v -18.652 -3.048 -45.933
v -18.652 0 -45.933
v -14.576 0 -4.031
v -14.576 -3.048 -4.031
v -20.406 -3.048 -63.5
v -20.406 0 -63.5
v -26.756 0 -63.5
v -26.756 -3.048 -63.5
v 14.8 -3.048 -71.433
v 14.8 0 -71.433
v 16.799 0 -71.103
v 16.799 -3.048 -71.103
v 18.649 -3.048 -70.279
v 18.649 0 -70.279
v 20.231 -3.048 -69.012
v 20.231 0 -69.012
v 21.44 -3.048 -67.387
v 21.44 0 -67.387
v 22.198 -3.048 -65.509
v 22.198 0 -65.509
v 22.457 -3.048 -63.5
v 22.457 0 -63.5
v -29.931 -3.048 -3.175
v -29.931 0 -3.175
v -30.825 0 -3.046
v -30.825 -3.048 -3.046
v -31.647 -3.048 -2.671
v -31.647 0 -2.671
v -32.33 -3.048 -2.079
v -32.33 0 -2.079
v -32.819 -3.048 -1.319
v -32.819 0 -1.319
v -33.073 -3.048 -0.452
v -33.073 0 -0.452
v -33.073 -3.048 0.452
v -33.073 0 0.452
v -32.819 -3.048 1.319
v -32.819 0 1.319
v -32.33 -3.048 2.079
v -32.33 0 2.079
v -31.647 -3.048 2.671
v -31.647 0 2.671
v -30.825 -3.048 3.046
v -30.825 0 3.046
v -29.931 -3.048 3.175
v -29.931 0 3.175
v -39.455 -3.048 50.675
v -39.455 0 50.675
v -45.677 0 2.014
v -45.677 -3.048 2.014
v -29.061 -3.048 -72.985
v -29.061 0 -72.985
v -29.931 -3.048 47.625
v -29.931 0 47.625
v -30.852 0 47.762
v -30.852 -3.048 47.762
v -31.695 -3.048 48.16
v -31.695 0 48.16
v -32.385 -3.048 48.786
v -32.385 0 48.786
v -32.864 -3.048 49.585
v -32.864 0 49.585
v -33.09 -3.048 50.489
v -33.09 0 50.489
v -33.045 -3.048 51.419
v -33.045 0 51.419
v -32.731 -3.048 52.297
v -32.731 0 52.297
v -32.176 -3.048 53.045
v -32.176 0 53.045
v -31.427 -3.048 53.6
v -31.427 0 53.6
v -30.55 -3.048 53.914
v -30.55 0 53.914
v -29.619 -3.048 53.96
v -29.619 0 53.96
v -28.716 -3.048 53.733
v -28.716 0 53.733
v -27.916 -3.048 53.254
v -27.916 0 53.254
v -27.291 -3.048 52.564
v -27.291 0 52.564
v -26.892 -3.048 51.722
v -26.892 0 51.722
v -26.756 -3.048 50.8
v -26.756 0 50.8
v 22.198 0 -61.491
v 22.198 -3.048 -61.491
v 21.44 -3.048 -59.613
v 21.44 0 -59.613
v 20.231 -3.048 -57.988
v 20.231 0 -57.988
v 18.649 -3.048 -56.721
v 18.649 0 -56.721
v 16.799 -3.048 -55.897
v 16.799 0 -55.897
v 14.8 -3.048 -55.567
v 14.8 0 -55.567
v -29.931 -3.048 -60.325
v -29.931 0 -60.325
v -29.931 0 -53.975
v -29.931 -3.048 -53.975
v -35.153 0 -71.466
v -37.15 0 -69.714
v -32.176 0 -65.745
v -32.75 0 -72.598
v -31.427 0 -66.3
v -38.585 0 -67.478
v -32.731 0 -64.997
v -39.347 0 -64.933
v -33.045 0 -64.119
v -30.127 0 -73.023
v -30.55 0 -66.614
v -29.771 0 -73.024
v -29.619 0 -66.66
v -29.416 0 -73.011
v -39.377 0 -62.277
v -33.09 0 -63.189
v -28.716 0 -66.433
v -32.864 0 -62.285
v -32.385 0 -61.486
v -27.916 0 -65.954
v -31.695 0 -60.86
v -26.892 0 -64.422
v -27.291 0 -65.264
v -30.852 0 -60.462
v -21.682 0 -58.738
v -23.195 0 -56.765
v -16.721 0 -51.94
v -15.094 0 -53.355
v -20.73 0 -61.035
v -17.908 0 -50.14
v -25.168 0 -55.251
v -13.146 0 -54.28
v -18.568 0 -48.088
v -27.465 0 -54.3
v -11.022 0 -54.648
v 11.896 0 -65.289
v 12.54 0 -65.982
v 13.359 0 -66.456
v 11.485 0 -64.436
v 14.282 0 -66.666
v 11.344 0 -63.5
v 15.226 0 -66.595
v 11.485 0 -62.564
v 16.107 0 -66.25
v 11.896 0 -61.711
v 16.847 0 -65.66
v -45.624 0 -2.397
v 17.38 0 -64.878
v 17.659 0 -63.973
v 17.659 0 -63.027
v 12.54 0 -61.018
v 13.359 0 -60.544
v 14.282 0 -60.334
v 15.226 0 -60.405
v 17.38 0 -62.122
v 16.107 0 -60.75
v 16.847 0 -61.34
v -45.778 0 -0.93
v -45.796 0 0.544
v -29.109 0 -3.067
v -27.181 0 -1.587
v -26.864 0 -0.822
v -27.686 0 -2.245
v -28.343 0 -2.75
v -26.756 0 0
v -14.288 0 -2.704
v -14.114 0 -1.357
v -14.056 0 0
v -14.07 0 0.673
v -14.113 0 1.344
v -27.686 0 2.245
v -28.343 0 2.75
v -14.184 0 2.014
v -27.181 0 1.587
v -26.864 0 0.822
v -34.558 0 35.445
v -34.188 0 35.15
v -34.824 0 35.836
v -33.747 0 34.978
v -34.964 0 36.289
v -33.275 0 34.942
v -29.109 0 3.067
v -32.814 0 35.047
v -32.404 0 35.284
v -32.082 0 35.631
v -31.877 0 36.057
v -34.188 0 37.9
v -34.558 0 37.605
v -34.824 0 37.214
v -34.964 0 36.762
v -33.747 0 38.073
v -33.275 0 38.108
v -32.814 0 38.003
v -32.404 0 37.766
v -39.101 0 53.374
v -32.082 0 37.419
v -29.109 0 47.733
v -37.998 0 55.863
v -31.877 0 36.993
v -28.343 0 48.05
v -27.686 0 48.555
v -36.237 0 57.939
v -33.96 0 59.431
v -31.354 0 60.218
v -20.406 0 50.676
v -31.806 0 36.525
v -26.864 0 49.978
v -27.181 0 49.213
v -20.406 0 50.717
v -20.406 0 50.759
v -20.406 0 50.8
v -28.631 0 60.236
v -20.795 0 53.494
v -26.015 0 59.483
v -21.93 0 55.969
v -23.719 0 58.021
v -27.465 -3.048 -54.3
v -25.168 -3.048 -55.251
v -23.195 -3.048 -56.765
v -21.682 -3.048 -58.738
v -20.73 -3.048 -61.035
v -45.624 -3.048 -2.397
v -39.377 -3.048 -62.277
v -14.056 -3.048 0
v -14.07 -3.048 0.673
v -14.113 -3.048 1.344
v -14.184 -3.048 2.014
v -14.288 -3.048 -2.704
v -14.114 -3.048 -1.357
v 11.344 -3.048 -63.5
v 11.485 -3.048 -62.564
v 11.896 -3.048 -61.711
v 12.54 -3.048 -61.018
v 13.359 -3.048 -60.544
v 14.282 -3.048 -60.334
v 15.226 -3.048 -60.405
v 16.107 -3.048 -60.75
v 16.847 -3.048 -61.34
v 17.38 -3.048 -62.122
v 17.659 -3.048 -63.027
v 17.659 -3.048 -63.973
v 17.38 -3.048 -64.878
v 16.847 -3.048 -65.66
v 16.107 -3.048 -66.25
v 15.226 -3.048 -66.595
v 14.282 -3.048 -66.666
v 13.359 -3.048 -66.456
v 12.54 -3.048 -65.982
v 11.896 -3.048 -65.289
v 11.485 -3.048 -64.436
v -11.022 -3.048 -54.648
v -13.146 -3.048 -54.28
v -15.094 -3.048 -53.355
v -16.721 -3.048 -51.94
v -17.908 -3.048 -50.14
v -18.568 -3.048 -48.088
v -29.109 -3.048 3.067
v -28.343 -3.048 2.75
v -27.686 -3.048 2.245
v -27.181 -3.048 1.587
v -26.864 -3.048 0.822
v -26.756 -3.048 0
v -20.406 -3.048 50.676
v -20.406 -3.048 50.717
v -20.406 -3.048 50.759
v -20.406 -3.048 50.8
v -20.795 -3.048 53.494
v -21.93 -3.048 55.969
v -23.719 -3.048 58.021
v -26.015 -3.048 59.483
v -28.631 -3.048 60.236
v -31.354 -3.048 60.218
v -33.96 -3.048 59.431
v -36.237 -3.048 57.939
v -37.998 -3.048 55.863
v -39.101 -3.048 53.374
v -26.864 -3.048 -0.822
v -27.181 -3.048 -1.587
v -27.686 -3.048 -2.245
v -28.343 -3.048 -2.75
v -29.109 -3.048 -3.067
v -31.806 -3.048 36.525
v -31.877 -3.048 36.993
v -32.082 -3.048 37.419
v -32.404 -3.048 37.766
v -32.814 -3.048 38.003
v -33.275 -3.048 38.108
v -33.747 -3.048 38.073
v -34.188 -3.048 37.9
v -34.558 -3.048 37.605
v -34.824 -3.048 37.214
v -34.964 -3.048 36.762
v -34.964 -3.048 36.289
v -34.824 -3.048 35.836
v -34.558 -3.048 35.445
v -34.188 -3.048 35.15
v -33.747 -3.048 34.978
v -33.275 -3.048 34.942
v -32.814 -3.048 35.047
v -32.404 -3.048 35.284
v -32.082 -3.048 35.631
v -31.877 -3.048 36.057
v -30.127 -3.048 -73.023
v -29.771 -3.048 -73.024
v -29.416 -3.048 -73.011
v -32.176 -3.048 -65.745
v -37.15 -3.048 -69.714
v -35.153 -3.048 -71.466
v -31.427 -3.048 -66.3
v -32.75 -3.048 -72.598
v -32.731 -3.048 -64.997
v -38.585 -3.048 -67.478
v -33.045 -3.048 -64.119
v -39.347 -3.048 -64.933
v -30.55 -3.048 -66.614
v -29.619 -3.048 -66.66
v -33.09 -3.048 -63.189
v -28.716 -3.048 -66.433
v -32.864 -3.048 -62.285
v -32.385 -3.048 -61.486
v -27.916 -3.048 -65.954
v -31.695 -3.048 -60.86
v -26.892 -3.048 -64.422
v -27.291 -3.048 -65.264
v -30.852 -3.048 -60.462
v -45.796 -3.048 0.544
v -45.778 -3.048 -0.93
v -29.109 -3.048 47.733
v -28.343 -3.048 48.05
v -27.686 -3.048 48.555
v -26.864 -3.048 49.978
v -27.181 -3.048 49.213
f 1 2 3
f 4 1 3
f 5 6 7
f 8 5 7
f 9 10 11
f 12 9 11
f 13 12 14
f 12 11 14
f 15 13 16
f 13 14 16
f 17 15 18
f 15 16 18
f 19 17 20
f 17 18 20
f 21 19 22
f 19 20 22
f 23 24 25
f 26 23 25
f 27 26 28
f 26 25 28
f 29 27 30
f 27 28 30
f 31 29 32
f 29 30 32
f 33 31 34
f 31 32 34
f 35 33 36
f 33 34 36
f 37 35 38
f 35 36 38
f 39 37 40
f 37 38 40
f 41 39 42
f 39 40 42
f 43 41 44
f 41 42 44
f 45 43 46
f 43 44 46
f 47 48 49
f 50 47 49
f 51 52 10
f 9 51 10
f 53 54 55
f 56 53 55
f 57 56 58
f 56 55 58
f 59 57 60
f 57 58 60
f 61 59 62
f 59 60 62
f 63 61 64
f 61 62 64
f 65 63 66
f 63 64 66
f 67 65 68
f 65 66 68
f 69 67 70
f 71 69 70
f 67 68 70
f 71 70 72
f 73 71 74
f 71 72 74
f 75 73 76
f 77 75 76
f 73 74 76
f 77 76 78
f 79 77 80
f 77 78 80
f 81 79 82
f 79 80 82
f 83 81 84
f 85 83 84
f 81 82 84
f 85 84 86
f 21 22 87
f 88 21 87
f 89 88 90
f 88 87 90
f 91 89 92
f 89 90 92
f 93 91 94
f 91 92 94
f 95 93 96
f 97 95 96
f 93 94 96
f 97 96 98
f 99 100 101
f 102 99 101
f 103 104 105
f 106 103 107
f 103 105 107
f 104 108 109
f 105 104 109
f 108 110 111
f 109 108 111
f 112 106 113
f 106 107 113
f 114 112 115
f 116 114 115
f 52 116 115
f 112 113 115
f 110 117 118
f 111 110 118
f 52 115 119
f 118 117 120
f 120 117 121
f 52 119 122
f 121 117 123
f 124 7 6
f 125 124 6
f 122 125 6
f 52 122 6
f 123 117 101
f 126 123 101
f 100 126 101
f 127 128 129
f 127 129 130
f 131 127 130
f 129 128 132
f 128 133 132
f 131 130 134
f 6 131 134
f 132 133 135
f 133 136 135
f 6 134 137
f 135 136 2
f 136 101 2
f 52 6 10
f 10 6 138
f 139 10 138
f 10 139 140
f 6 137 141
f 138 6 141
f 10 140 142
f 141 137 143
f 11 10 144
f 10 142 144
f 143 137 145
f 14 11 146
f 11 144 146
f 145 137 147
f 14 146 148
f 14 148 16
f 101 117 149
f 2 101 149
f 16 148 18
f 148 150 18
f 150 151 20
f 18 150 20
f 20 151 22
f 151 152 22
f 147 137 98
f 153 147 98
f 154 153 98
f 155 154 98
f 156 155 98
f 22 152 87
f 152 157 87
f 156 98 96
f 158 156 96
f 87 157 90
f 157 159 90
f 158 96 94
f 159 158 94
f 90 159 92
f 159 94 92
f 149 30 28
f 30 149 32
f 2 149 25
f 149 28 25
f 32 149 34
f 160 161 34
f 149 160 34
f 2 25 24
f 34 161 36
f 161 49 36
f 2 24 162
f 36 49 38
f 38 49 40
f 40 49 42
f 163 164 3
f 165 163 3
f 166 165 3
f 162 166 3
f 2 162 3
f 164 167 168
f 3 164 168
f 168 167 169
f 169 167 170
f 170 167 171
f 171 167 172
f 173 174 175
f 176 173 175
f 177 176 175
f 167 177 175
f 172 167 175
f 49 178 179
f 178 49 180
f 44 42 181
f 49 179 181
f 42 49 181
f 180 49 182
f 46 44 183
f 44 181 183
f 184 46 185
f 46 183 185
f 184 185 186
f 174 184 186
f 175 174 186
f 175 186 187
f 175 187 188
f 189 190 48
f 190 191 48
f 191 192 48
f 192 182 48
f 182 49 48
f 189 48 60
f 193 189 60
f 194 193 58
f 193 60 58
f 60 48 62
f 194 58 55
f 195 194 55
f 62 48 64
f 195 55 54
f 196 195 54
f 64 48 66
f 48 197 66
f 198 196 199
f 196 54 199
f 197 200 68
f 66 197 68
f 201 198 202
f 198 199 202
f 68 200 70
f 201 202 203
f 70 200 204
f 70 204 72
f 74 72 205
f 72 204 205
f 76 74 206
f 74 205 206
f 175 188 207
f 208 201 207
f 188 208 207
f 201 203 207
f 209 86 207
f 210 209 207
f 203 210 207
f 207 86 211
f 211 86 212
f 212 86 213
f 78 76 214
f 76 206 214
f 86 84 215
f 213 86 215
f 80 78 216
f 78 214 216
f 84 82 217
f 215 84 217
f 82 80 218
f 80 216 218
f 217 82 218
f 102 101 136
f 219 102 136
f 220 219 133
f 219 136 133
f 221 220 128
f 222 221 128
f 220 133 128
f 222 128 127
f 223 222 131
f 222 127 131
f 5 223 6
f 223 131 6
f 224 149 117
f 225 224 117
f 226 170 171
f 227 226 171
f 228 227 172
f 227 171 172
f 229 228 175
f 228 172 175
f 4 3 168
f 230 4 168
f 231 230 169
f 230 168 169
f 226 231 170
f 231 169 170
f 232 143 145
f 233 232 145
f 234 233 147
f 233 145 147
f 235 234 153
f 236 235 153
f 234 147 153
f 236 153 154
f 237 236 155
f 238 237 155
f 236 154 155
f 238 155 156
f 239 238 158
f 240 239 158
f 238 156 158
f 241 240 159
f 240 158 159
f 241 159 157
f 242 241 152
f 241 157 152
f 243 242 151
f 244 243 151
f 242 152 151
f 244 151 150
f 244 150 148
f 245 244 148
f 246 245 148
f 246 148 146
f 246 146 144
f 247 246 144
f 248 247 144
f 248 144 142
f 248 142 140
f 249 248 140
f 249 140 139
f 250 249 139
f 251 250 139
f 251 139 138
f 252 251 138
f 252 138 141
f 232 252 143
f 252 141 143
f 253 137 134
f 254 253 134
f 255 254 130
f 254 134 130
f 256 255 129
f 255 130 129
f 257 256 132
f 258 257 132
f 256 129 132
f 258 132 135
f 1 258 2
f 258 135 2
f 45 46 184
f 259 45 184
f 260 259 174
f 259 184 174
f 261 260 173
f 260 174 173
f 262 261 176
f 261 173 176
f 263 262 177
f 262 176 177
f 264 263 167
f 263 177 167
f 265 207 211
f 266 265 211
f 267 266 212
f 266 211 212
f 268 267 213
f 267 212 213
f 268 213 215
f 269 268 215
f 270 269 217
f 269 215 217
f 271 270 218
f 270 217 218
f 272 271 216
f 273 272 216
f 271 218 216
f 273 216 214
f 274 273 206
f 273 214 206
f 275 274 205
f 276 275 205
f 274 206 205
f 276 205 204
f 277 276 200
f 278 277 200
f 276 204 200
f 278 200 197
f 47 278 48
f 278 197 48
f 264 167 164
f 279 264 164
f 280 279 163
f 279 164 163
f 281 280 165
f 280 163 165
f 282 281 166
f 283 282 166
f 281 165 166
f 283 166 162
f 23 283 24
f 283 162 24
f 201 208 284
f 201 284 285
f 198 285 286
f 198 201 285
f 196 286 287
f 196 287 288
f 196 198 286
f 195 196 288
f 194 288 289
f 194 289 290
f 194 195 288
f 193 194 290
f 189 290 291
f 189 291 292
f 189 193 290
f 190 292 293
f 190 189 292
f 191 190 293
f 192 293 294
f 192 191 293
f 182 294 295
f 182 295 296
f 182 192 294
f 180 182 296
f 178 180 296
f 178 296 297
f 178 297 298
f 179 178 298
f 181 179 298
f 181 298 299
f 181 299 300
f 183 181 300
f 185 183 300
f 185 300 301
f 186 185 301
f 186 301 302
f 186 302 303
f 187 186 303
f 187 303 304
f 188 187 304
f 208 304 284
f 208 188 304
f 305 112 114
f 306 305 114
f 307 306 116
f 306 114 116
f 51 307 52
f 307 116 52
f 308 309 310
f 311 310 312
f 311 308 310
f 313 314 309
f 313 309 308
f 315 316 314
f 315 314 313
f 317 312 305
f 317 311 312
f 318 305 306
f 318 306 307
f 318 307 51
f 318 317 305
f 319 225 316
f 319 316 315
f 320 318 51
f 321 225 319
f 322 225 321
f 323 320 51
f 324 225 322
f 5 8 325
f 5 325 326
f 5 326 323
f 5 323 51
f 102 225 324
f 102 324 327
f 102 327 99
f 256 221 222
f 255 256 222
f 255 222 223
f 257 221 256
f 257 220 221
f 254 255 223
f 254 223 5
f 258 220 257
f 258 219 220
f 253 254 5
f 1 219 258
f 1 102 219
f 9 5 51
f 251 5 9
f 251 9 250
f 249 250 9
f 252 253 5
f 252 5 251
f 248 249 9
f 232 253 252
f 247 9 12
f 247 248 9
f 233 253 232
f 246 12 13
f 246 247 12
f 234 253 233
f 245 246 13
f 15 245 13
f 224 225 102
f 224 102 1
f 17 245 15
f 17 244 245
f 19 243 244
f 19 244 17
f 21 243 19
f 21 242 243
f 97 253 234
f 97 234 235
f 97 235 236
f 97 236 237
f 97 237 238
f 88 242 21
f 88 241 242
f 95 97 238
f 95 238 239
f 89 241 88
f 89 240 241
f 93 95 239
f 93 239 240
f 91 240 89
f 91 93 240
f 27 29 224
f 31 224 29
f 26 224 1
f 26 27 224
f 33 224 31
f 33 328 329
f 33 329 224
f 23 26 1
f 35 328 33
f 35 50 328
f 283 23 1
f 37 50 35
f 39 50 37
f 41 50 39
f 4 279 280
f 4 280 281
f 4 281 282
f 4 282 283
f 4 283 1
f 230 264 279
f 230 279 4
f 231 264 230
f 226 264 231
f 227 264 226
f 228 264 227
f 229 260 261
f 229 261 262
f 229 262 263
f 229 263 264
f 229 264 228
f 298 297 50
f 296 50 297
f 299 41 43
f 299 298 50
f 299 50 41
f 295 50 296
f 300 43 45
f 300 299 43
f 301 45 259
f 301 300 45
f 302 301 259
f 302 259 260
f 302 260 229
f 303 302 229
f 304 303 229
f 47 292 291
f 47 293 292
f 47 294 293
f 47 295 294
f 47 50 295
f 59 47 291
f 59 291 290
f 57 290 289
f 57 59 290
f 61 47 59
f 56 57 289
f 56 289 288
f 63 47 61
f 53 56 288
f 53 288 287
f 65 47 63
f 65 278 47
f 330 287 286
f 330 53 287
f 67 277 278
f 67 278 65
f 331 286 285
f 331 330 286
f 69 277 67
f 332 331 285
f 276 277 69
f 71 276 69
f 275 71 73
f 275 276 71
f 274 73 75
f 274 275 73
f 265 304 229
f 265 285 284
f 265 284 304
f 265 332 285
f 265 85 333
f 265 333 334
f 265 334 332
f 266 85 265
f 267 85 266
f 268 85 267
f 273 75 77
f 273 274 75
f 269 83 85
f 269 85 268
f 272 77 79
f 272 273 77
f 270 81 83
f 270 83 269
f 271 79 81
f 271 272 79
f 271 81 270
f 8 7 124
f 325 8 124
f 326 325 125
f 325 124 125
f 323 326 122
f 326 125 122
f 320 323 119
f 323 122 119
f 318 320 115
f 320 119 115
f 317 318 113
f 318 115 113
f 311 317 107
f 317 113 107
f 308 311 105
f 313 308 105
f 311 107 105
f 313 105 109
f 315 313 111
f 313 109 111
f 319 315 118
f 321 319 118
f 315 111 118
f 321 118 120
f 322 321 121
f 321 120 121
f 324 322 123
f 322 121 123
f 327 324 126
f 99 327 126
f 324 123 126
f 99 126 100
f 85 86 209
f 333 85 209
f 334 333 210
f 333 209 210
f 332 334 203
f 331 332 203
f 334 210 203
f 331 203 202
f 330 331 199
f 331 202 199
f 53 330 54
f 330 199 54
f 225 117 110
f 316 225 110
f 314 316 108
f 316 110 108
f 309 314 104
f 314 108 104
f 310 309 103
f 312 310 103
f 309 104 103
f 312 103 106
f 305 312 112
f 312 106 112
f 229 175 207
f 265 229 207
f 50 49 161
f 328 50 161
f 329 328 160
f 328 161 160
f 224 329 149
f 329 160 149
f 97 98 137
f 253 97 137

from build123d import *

# Parameters (mm, degrees)
F0_R     = 1.5875
F1_DEPTH = 3.048


# Not quite as in the source:
# - ends of sketch curves that miss each other by under 0.0002 mm in the source are joined


with BuildPart() as f1:
    # F0 (on Front) → F1 (new body)
    with BuildSketch(Plane.XZ):
        with BuildLine():
            ThreePointArc((-20.4063861121, 50.6759697353), (-20.4057804387, 50.7379835531), (-20.4055785447, 50.8))
            ThreePointArc((-20.4055785447, 50.8), (-29.9930844021, 60.3247949069), (-39.454758181, 50.6749909771))
            ThreePointArc((-39.454758181, 50.6749909771), (-36.6214272972, 44.0207546164), (-29.9305785447, 41.275))
            ThreePointArc((-29.9305785447, 41.275), (-23.2393814647, 44.0210984197), (-20.4063861121, 50.6759697353))
        make_face()
        with BuildLine():
            ThreePointArc((-26.7555785447, 50.8), (-27.6855145145, 48.5549359697), (-29.9305785447, 47.625))
            ThreePointArc((-29.9305785447, 47.625), (-32.175642575, 53.0450640303), (-26.7555785447, 50.8))
        make_face(mode=Mode.SUBTRACT)
        with BuildLine():
            ThreePointArc((-29.9305785447, 41.275), (-36.6214272972, 44.0207546164), (-39.454758181, 50.6749909771))
            Line((-39.454758181, 50.6749909771), (-45.6773538826, 2.0136264451))
            ThreePointArc((-45.6773538826, 2.0136264451), (-40.4198422268, 11.9159964924), (-29.9305785447, 15.875))
            Line((-29.9305785447, 15.875), (-29.9305785447, 41.275))
        make_face()
        with Locations((-33.3938002586, 36.5252)):
            Circle(F0_R, mode=Mode.SUBTRACT)
        with BuildLine():
            Line((-14.1837976059, 2.0135826444), (-20.4063861121, 50.6759697353))
            ThreePointArc((-20.4063861121, 50.6759697353), (-23.2393814647, 44.0210984197), (-29.9305785447, 41.275))
            Line((-29.9305785447, 41.275), (-29.9305785447, 15.875))
            ThreePointArc((-29.9305785447, 15.875), (-19.4412982901, 11.9159819041), (-14.1837976059, 2.0135826444))
        make_face()
        with BuildLine():
            ThreePointArc((-29.9305785447, 15.875), (-40.4198422268, 11.9159964924), (-45.6773538826, 2.0136264451))
            ThreePointArc((-45.6773538826, 2.0136264451), (-45.8043998708, -0.1934463924), (-45.6236065946, -2.3967677453))
            ThreePointArc((-45.6236065946, -2.3967677453), (-40.2738598675, -12.0429297298), (-29.9305785447, -15.875))
            Line((-29.9305785447, -15.875), (-29.9305785447, -3.175))
            ThreePointArc((-29.9305785447, -3.175), (-33.1055785447, 0), (-29.9305785447, 3.175))
            Line((-29.9305785447, 3.175), (-29.9305785447, 15.875))
        make_face()
        with BuildLine():
            ThreePointArc((-14.0555785447, 0), (-14.087665738, 1.0088304111), (-14.1837976059, 2.0135826444))
            ThreePointArc((-14.1837976059, 2.0135826444), (-19.4412982901, 11.9159819041), (-29.9305785447, 15.875))
            Line((-29.9305785447, 15.875), (-29.9305785447, 3.175))
            ThreePointArc((-29.9305785447, 3.175), (-27.6855145145, 2.2450640303), (-26.7555785447, 0))
            ThreePointArc((-26.7555785447, 0), (-27.6855145145, -2.2450640303), (-29.9305785447, -3.175))
            Line((-29.9305785447, -3.175), (-29.9305785447, -15.875))
            ThreePointArc((-29.9305785447, -15.875), (-20.2346648726, -12.5699993263), (-14.5759167084, -4.031127))
            ThreePointArc((-14.5759167084, -4.031127), (-14.1862004743, -2.0322854558), (-14.0555785447, 0))
        make_face()
        with BuildLine():
            ThreePointArc((-29.9305785447, -15.875), (-40.2738598675, -12.0429297298), (-45.6236065946, -2.3967677453))
            Line((-45.6236065946, -2.3967677453), (-39.3767361242, -62.2769987798))
            ThreePointArc((-39.3767361242, -62.2769987798), (-36.2185248858, -56.3454660661), (-29.9305785447, -53.975))
            Line((-29.9305785447, -53.975), (-29.9305785447, -15.875))
        make_face()
        with BuildLine():
            ThreePointArc((-14.5759167084, -4.031127), (-20.2346648726, -12.5699993263), (-29.9305785447, -15.875))
            Line((-29.9305785447, -15.875), (-29.9305785447, -53.975))
            ThreePointArc((-29.9305785447, -53.975), (-23.1953864539, -56.7648079092), (-20.4055785447, -63.5))
            Line((-20.4055785447, -63.5), (6.5819214553, -63.5))
            ThreePointArc((6.5819214553, -63.5), (9.0069371863, -57.7889209921), (14.8002328719, -55.5674688026))
            Line((14.8002328719, -55.5674688026), (-11.021864061, -54.648172114))
            ThreePointArc((-11.021864061, -54.648172114), (-16.7206173005, -51.9399910767), (-18.6518593628, -45.9333000481))
            Line((-18.6518593628, -45.9333000481), (-14.5759167084, -4.031127))
        make_face()
        with BuildLine():
            ThreePointArc((-29.9305785447, -53.975), (-36.2185248858, -56.3454660661), (-39.3767361242, -62.2769987798))
            ThreePointArc((-39.3767361242, -62.2769987798), (-37.1496877578, -69.7137015675), (-30.1273622995, -73.0229670352))
            Line((-30.1273622995, -73.0229670352), (-29.0609056002, -72.9852144925))
            ThreePointArc((-29.0609056002, -72.9852144925), (-22.8946258802, -69.920357864), (-20.4055785447, -63.5))
            Line((-20.4055785447, -63.5), (-26.7555785447, -63.5))
            ThreePointArc((-26.7555785447, -63.5), (-32.175642575, -65.7450640303), (-29.9305785447, -60.325))
            Line((-29.9305785447, -60.325), (-29.9305785447, -53.975))
        make_face()
        with BuildLine():
            Line((-29.0609056002, -72.9852144925), (-30.1273622995, -73.0229670352))
            ThreePointArc((-30.1273622995, -73.0229670352), (-29.593604838, -73.0190374367), (-29.0609056002, -72.9852144925))
        make_face()
        with BuildLine():
            Line((6.5819214553, -63.5), (-20.4055785447, -63.5))
            ThreePointArc((-20.4055785447, -63.5), (-22.8946258802, -69.920357864), (-29.0609056002, -72.9852144925))
            Line((-29.0609056002, -72.9852144925), (14.8002328776, -71.4325311972))
            ThreePointArc((14.8002328776, -71.4325311972), (9.0069371884, -69.2110790099), (6.5819214553, -63.5))
        make_face()
        with BuildLine():
            ThreePointArc((14.8002328719, -55.5674688026), (9.0069371863, -57.7889209921), (6.5819214553, -63.5))
            ThreePointArc((6.5819214553, -63.5), (9.0069371884, -69.2110790099), (14.8002328776, -71.4325311972))
            ThreePointArc((14.8002328776, -71.4325311972), (20.2305004652, -69.0124842669), (22.4569214553, -63.5))
            ThreePointArc((22.4569214553, -63.5), (20.2305004632, -57.9875157311), (14.8002328719, -55.5674688026))
        make_face()
        with BuildLine():
            ThreePointArc((17.6944214553, -63.5), (14.5194214553, -66.675), (11.3444214553, -63.5))
            ThreePointArc((11.3444214553, -63.5), (14.5194214553, -60.325), (17.6944214553, -63.5))
        make_face(mode=Mode.SUBTRACT)
    extrude(amount=F1_DEPTH)


solid = f1.part
